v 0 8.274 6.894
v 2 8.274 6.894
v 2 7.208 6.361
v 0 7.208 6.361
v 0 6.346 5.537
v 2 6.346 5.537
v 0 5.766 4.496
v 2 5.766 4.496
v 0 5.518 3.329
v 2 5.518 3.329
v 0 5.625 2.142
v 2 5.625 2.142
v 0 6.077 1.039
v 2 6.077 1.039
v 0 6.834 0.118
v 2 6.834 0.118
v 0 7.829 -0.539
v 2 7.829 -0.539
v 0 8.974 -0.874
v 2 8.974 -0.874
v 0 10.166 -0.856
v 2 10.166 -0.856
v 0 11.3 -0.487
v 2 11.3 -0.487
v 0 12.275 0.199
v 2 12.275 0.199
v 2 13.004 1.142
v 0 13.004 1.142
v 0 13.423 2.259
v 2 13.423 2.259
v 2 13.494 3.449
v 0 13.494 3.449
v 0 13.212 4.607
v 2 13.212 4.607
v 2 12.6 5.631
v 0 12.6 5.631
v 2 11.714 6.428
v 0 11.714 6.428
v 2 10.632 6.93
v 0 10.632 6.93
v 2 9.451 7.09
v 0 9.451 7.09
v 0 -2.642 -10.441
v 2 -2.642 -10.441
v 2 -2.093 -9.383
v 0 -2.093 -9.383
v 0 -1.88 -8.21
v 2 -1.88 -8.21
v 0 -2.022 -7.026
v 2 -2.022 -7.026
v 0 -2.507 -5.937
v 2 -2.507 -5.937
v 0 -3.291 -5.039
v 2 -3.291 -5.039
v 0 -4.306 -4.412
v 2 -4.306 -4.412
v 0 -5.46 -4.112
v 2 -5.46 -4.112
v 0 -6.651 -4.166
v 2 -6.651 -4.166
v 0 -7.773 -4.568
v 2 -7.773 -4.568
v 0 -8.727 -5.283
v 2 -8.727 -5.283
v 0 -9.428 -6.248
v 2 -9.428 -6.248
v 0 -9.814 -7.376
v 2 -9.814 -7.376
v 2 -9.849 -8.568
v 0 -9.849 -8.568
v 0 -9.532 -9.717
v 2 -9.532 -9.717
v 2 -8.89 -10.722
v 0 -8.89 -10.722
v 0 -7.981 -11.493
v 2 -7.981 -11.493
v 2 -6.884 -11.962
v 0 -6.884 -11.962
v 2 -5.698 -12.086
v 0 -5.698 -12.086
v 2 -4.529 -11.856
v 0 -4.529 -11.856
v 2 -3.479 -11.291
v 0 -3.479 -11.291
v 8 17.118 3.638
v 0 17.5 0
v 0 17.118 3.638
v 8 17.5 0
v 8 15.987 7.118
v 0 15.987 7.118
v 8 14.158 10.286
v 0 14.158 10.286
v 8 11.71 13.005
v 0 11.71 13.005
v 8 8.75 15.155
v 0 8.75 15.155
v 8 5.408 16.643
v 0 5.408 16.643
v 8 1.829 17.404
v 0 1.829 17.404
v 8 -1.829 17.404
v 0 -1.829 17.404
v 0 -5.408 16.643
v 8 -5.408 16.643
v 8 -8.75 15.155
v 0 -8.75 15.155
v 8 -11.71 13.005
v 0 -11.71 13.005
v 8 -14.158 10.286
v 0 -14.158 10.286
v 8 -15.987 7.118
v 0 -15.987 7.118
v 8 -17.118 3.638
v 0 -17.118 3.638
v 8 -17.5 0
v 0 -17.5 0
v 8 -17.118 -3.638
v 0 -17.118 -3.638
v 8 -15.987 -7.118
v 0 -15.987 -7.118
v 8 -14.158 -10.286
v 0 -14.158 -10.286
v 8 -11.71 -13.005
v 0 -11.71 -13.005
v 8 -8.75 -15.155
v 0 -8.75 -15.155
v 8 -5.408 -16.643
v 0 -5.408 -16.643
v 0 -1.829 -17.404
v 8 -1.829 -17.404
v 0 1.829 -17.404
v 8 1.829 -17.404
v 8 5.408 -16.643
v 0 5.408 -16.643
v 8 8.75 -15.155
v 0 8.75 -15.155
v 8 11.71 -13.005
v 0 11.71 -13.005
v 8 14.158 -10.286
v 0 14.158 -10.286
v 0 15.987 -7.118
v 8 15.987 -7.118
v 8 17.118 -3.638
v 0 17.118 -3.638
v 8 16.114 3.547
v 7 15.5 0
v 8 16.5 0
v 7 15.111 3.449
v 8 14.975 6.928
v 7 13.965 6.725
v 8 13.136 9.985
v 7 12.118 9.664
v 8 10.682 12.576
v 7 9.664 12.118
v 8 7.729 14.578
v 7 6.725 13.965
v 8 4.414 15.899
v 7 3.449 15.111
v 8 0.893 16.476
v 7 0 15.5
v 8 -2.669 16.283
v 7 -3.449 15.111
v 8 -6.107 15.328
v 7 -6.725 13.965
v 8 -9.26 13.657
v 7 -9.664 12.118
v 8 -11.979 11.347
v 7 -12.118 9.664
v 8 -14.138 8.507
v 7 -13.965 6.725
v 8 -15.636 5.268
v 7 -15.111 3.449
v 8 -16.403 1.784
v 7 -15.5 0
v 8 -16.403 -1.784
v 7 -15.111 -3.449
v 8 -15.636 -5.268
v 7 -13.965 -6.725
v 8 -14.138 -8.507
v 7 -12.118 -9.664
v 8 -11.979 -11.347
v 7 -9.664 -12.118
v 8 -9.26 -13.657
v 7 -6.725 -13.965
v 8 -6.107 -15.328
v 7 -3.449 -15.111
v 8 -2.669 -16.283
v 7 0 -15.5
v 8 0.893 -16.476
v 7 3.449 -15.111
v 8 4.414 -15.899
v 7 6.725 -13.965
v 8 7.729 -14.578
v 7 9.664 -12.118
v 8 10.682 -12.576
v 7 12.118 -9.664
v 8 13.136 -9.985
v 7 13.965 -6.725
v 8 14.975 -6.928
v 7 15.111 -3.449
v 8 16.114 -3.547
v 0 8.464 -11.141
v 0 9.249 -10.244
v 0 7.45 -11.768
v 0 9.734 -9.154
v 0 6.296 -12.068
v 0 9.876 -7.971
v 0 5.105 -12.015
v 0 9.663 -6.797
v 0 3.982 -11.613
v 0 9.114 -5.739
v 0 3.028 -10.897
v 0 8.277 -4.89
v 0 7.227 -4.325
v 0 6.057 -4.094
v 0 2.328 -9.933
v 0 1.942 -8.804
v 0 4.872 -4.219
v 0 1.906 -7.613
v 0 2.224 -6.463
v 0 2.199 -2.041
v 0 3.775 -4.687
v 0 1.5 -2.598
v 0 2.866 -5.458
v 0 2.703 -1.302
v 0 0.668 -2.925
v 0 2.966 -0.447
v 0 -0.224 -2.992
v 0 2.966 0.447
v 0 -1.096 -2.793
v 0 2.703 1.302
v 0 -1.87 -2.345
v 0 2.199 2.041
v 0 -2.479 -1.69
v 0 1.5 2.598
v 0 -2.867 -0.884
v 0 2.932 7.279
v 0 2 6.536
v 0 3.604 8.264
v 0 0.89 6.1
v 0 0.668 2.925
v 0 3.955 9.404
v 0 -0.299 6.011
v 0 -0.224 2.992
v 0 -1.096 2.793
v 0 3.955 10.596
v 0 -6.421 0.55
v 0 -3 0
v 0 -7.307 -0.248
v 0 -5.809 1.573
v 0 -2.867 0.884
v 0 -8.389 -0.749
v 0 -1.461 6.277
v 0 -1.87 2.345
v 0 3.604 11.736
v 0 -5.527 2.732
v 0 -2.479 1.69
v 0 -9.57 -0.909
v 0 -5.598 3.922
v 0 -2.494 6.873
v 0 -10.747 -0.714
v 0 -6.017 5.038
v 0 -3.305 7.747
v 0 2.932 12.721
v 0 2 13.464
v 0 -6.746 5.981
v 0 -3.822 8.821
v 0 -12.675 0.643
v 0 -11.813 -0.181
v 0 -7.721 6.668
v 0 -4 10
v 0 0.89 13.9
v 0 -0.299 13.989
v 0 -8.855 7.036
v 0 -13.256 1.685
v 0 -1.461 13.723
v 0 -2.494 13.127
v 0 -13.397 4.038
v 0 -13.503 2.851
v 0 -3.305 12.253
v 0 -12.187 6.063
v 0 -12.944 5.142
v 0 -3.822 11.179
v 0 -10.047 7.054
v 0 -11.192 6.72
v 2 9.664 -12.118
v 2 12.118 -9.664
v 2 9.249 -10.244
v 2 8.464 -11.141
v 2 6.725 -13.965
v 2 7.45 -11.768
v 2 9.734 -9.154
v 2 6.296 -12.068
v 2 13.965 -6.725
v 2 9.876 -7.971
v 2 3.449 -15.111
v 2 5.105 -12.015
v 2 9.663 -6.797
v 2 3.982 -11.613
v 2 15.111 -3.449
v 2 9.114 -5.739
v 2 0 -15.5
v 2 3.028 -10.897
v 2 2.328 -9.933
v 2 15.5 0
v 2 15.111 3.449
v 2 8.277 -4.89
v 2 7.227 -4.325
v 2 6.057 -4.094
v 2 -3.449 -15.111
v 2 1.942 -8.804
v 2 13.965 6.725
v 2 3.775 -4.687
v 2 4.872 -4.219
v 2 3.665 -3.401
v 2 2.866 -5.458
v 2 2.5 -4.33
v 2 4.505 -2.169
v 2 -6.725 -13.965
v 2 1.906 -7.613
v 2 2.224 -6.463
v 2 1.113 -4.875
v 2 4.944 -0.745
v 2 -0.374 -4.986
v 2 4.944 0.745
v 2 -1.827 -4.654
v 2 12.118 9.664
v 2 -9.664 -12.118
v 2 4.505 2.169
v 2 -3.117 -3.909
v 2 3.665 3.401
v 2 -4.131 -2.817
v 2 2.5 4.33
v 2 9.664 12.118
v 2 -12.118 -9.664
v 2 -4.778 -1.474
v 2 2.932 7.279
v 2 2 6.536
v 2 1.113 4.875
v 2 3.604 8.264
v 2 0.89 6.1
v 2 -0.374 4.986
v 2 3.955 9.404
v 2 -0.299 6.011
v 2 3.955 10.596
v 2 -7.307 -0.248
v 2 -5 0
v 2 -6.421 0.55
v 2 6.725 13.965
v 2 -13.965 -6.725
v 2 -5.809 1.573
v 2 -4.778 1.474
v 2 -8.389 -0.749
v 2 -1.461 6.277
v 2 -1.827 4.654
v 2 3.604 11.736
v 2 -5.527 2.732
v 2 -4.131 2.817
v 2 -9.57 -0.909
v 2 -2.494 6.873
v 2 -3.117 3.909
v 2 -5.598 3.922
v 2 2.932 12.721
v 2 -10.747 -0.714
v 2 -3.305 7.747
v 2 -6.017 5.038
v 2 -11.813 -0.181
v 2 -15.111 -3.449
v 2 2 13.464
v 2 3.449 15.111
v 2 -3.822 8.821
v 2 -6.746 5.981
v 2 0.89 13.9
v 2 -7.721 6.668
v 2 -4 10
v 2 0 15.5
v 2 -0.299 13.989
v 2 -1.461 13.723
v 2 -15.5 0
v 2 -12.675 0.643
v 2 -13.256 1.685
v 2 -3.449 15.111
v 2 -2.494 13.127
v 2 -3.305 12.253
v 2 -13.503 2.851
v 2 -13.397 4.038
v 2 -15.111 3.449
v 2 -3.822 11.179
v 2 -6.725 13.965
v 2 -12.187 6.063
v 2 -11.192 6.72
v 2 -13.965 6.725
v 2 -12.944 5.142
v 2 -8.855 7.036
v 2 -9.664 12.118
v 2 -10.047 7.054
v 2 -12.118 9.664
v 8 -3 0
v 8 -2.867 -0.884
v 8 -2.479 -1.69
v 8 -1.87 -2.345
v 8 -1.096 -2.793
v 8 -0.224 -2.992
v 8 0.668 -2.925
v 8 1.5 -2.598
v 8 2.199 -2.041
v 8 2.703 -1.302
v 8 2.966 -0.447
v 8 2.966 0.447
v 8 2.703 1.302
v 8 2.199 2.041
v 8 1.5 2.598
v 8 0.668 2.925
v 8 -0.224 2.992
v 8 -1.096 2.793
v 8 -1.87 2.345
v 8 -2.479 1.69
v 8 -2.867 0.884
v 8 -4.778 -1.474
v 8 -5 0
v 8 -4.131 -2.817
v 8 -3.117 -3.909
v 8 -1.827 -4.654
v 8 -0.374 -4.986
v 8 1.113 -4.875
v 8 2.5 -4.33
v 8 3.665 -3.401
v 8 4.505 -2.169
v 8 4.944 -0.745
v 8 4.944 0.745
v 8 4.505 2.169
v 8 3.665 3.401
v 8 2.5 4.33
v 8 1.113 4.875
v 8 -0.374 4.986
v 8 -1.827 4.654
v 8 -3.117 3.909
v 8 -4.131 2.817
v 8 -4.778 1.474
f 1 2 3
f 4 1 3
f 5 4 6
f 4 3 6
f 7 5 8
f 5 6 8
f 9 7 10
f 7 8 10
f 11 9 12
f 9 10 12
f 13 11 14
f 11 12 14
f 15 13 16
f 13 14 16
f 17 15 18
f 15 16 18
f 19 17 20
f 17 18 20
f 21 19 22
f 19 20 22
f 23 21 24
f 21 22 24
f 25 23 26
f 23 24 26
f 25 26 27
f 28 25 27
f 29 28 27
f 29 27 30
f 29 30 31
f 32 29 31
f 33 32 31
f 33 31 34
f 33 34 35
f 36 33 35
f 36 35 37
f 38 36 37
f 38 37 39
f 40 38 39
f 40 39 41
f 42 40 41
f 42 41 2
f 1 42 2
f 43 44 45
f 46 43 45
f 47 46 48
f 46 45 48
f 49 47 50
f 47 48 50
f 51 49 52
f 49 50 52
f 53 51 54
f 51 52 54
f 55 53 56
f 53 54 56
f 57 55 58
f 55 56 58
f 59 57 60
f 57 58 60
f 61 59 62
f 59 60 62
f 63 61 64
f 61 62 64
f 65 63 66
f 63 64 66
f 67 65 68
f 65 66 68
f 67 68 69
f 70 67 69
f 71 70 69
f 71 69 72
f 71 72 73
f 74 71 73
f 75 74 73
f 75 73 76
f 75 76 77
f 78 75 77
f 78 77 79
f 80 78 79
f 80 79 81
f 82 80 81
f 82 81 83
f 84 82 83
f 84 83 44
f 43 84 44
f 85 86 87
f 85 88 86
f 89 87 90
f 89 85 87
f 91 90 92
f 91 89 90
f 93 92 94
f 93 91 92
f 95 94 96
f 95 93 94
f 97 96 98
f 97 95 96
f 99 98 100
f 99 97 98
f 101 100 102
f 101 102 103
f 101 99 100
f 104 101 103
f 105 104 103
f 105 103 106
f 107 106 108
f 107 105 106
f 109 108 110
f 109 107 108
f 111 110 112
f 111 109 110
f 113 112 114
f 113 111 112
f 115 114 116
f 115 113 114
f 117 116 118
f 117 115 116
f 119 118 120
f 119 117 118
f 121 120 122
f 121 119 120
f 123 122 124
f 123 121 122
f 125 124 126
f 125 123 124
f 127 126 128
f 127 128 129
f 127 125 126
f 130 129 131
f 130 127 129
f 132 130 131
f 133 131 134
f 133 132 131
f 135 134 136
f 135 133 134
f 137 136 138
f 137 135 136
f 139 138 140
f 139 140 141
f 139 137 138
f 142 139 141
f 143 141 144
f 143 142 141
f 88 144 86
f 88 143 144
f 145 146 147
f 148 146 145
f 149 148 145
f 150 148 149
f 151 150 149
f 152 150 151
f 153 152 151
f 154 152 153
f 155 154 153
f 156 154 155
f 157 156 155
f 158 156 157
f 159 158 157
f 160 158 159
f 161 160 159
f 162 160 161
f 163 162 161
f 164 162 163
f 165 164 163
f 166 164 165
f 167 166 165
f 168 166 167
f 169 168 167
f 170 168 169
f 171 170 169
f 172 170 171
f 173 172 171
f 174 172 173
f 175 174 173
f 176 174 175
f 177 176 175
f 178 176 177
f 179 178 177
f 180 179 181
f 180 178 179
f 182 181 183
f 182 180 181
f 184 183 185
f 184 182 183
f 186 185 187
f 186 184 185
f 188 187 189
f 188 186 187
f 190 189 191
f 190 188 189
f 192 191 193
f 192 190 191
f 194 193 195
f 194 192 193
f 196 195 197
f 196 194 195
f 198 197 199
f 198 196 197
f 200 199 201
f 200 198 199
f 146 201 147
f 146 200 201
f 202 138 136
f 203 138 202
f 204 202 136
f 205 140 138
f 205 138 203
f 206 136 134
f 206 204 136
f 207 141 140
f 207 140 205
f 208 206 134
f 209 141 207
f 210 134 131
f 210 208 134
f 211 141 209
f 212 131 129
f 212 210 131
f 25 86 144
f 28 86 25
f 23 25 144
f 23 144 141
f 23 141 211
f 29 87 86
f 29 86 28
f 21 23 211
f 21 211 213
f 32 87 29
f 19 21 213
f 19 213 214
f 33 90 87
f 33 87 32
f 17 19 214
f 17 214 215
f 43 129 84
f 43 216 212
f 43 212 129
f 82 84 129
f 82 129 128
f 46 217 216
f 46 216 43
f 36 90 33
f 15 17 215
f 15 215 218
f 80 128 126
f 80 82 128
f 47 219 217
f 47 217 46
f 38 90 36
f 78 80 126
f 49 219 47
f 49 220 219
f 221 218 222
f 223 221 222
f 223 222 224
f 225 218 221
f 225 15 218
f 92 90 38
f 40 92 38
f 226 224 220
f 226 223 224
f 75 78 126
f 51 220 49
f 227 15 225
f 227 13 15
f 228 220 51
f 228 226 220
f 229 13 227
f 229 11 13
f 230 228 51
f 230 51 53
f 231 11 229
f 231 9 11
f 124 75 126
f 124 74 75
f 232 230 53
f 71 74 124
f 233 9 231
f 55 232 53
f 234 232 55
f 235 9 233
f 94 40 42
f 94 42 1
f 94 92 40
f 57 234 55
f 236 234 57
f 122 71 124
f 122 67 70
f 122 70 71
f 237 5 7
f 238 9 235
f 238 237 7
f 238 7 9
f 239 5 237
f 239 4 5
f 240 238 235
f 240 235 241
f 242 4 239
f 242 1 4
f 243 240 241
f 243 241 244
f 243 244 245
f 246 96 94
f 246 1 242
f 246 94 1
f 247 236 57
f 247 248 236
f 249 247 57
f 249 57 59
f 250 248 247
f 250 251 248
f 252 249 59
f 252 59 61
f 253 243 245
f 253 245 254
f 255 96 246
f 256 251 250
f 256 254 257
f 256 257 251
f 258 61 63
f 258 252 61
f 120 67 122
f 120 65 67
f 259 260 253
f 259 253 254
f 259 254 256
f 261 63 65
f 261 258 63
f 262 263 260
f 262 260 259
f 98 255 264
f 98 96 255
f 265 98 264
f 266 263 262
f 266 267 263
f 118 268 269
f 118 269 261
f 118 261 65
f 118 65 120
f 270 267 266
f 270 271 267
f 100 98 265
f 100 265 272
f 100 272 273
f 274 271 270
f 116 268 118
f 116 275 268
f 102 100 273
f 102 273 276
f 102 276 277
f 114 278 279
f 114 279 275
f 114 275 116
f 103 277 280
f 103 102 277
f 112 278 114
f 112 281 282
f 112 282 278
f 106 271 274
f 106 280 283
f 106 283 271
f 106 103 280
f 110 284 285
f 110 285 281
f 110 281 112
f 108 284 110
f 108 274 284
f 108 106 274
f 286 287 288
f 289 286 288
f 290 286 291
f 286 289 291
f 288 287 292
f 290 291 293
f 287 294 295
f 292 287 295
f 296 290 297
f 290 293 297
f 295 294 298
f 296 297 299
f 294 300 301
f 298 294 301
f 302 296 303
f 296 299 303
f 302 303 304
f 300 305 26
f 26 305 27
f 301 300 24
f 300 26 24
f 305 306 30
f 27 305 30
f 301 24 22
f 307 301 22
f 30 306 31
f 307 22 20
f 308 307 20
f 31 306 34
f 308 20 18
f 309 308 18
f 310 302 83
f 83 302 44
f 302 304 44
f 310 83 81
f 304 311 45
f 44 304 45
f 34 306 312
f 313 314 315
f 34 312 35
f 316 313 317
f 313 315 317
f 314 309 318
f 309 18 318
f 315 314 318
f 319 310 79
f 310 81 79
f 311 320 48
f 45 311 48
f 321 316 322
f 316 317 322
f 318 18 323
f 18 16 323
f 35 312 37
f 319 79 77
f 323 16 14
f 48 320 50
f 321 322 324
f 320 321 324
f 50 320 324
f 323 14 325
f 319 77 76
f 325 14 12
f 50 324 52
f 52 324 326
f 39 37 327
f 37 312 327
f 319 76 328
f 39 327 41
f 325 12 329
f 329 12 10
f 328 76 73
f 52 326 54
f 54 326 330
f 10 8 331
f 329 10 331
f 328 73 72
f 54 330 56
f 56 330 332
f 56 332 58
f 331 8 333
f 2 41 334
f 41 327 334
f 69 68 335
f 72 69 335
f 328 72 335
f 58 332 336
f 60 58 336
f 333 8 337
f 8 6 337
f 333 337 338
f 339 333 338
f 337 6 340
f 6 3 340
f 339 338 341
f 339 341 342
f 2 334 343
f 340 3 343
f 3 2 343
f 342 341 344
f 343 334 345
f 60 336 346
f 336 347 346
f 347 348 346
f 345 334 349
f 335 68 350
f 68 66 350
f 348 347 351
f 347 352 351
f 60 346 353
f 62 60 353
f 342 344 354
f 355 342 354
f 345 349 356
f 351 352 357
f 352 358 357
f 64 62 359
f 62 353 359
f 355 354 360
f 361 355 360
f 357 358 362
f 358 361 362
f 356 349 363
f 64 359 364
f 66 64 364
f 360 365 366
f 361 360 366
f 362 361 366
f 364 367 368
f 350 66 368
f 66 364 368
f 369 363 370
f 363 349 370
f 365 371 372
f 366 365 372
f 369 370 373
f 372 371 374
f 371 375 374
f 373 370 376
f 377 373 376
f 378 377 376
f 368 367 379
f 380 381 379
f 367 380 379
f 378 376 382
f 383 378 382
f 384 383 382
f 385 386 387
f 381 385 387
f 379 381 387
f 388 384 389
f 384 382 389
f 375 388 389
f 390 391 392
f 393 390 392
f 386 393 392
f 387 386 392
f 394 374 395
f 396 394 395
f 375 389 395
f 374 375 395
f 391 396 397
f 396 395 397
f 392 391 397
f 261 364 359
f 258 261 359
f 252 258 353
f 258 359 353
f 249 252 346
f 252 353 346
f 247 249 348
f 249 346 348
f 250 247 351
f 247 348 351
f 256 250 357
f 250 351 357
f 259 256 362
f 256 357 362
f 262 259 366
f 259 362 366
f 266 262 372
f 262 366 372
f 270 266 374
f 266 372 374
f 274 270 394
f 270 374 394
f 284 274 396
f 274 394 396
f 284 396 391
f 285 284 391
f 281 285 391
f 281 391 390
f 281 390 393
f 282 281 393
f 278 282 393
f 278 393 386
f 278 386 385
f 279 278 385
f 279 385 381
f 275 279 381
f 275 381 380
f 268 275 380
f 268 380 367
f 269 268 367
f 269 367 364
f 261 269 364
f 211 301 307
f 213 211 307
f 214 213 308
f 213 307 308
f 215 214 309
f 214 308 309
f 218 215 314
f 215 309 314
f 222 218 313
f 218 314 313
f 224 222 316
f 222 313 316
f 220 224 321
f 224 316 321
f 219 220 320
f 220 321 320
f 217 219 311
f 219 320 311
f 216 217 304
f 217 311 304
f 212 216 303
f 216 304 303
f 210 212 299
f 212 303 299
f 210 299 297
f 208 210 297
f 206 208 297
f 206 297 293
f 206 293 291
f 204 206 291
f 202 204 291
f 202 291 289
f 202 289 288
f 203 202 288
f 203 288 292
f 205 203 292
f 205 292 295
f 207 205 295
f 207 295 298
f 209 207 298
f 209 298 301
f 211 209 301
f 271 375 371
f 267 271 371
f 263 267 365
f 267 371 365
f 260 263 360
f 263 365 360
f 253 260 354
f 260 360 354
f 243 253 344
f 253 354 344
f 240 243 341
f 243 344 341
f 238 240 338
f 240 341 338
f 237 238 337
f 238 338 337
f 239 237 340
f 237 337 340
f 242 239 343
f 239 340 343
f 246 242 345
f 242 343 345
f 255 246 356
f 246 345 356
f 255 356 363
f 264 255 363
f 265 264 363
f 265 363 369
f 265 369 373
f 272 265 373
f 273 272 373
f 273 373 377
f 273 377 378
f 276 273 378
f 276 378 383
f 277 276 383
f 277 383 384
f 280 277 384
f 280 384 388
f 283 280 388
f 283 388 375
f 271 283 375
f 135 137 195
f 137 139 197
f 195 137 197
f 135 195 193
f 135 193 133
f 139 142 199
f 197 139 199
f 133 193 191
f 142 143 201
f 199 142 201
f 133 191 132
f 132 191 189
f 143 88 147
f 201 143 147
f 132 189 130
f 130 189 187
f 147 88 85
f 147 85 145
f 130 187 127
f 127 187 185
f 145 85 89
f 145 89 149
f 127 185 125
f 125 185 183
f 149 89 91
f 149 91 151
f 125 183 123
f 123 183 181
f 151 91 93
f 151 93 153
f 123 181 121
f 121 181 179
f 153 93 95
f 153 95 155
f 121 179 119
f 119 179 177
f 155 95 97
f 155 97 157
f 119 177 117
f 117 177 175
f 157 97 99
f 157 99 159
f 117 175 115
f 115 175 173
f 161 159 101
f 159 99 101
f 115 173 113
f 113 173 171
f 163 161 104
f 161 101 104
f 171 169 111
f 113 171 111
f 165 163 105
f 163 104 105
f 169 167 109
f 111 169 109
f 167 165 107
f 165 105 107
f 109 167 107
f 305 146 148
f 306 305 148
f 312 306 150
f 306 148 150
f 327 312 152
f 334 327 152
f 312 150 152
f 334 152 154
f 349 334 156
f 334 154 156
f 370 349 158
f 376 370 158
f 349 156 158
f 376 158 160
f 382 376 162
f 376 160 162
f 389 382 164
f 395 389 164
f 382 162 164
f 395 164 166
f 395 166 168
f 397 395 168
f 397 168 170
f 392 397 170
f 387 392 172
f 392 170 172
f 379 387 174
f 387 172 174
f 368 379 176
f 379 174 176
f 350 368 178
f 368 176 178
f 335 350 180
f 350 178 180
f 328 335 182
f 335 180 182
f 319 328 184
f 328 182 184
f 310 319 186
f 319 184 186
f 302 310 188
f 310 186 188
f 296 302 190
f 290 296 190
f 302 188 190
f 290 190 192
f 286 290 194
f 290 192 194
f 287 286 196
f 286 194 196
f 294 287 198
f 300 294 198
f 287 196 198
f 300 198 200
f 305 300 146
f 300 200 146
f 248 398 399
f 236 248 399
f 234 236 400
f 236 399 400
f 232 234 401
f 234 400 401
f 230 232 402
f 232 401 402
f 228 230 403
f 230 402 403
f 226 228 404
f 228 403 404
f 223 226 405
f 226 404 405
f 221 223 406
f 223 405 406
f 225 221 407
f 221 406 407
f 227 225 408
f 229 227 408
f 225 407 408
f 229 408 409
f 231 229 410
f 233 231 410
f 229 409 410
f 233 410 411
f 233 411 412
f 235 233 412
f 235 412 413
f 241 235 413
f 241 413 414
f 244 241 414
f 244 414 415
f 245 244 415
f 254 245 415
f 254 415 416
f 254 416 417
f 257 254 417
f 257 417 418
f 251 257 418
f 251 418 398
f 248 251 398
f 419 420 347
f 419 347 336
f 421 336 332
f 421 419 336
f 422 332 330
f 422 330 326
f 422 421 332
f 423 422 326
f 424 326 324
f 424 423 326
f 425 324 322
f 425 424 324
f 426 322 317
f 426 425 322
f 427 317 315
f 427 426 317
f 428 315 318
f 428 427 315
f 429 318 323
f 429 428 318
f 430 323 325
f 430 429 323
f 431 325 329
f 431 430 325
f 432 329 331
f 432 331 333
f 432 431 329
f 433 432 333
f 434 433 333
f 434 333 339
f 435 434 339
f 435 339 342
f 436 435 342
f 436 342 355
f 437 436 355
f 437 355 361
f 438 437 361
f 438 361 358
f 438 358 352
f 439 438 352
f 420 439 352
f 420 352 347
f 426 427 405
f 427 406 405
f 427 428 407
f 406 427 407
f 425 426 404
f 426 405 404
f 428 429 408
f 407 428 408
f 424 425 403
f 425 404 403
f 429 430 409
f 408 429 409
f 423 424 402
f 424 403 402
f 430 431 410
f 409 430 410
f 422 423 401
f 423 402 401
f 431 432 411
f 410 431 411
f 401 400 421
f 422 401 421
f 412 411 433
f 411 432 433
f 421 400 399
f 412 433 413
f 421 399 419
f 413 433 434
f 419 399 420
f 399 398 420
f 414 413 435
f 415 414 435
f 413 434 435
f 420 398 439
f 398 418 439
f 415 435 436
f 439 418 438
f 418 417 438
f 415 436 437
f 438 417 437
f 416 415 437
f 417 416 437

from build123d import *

# Parameters (mm, degrees)
F0_W            = 8
F0_H            = 17.5
F3_D            = 6
F4_T            = -2
F6_D            = 8
F6_COPIES_COUNT = 5
F7_SIZE         = 1


# Not quite as in the source:
# - a pattern or mirror of a feature is missing from the dataset's text; its kind, count and spacing are read off the source's solid


with BuildPart() as f1:
    # F0 (on Top) → F1 (revolve)
    with BuildSketch(Plane.XY):
        with Locations((4, 8.75)):
            Rectangle(F0_W, F0_H)
    revolve(axis=Axis((4, 0, 0), (1, 0, 0)))

    # F3 (through all)
    with Locations(Plane(origin=(0, 0, 0), x_dir=(0, 1, 0), z_dir=(-1, 0, 0))):
        with Locations((0, 0)):
            Hole(F3_D / 2)

    # F4
    f4_openings = [f1.faces().sort_by_distance(p)[0] for p in [
        (8, -17.005025, 0),
    ]]
    offset(amount=F4_T, openings=f4_openings)

    # F6 (through all)
    with Locations(Plane(origin=(0, 0, 0), x_dir=(0, 1, 0), z_dir=(-1, 0, 0))):
        with Locations((0, -10)):
            f6 = Hole(F6_D / 2)

    # F6_copies: F6 ×5 about axis
    f6_copies_axis = Axis((0, 0, 0), (1, 0, 0))
    for i in range(1, F6_COPIES_COUNT):
        add(f6.rotate(f6_copies_axis, i * 360 / F6_COPIES_COUNT), mode=Mode.SUBTRACT)

    # F7
    f7_edges = [f1.edges().sort_by_distance(p)[0] for p in [
        (8, -15.5, 0),
    ]]
    chamfer(f7_edges, length=F7_SIZE)


solid = f1.part
